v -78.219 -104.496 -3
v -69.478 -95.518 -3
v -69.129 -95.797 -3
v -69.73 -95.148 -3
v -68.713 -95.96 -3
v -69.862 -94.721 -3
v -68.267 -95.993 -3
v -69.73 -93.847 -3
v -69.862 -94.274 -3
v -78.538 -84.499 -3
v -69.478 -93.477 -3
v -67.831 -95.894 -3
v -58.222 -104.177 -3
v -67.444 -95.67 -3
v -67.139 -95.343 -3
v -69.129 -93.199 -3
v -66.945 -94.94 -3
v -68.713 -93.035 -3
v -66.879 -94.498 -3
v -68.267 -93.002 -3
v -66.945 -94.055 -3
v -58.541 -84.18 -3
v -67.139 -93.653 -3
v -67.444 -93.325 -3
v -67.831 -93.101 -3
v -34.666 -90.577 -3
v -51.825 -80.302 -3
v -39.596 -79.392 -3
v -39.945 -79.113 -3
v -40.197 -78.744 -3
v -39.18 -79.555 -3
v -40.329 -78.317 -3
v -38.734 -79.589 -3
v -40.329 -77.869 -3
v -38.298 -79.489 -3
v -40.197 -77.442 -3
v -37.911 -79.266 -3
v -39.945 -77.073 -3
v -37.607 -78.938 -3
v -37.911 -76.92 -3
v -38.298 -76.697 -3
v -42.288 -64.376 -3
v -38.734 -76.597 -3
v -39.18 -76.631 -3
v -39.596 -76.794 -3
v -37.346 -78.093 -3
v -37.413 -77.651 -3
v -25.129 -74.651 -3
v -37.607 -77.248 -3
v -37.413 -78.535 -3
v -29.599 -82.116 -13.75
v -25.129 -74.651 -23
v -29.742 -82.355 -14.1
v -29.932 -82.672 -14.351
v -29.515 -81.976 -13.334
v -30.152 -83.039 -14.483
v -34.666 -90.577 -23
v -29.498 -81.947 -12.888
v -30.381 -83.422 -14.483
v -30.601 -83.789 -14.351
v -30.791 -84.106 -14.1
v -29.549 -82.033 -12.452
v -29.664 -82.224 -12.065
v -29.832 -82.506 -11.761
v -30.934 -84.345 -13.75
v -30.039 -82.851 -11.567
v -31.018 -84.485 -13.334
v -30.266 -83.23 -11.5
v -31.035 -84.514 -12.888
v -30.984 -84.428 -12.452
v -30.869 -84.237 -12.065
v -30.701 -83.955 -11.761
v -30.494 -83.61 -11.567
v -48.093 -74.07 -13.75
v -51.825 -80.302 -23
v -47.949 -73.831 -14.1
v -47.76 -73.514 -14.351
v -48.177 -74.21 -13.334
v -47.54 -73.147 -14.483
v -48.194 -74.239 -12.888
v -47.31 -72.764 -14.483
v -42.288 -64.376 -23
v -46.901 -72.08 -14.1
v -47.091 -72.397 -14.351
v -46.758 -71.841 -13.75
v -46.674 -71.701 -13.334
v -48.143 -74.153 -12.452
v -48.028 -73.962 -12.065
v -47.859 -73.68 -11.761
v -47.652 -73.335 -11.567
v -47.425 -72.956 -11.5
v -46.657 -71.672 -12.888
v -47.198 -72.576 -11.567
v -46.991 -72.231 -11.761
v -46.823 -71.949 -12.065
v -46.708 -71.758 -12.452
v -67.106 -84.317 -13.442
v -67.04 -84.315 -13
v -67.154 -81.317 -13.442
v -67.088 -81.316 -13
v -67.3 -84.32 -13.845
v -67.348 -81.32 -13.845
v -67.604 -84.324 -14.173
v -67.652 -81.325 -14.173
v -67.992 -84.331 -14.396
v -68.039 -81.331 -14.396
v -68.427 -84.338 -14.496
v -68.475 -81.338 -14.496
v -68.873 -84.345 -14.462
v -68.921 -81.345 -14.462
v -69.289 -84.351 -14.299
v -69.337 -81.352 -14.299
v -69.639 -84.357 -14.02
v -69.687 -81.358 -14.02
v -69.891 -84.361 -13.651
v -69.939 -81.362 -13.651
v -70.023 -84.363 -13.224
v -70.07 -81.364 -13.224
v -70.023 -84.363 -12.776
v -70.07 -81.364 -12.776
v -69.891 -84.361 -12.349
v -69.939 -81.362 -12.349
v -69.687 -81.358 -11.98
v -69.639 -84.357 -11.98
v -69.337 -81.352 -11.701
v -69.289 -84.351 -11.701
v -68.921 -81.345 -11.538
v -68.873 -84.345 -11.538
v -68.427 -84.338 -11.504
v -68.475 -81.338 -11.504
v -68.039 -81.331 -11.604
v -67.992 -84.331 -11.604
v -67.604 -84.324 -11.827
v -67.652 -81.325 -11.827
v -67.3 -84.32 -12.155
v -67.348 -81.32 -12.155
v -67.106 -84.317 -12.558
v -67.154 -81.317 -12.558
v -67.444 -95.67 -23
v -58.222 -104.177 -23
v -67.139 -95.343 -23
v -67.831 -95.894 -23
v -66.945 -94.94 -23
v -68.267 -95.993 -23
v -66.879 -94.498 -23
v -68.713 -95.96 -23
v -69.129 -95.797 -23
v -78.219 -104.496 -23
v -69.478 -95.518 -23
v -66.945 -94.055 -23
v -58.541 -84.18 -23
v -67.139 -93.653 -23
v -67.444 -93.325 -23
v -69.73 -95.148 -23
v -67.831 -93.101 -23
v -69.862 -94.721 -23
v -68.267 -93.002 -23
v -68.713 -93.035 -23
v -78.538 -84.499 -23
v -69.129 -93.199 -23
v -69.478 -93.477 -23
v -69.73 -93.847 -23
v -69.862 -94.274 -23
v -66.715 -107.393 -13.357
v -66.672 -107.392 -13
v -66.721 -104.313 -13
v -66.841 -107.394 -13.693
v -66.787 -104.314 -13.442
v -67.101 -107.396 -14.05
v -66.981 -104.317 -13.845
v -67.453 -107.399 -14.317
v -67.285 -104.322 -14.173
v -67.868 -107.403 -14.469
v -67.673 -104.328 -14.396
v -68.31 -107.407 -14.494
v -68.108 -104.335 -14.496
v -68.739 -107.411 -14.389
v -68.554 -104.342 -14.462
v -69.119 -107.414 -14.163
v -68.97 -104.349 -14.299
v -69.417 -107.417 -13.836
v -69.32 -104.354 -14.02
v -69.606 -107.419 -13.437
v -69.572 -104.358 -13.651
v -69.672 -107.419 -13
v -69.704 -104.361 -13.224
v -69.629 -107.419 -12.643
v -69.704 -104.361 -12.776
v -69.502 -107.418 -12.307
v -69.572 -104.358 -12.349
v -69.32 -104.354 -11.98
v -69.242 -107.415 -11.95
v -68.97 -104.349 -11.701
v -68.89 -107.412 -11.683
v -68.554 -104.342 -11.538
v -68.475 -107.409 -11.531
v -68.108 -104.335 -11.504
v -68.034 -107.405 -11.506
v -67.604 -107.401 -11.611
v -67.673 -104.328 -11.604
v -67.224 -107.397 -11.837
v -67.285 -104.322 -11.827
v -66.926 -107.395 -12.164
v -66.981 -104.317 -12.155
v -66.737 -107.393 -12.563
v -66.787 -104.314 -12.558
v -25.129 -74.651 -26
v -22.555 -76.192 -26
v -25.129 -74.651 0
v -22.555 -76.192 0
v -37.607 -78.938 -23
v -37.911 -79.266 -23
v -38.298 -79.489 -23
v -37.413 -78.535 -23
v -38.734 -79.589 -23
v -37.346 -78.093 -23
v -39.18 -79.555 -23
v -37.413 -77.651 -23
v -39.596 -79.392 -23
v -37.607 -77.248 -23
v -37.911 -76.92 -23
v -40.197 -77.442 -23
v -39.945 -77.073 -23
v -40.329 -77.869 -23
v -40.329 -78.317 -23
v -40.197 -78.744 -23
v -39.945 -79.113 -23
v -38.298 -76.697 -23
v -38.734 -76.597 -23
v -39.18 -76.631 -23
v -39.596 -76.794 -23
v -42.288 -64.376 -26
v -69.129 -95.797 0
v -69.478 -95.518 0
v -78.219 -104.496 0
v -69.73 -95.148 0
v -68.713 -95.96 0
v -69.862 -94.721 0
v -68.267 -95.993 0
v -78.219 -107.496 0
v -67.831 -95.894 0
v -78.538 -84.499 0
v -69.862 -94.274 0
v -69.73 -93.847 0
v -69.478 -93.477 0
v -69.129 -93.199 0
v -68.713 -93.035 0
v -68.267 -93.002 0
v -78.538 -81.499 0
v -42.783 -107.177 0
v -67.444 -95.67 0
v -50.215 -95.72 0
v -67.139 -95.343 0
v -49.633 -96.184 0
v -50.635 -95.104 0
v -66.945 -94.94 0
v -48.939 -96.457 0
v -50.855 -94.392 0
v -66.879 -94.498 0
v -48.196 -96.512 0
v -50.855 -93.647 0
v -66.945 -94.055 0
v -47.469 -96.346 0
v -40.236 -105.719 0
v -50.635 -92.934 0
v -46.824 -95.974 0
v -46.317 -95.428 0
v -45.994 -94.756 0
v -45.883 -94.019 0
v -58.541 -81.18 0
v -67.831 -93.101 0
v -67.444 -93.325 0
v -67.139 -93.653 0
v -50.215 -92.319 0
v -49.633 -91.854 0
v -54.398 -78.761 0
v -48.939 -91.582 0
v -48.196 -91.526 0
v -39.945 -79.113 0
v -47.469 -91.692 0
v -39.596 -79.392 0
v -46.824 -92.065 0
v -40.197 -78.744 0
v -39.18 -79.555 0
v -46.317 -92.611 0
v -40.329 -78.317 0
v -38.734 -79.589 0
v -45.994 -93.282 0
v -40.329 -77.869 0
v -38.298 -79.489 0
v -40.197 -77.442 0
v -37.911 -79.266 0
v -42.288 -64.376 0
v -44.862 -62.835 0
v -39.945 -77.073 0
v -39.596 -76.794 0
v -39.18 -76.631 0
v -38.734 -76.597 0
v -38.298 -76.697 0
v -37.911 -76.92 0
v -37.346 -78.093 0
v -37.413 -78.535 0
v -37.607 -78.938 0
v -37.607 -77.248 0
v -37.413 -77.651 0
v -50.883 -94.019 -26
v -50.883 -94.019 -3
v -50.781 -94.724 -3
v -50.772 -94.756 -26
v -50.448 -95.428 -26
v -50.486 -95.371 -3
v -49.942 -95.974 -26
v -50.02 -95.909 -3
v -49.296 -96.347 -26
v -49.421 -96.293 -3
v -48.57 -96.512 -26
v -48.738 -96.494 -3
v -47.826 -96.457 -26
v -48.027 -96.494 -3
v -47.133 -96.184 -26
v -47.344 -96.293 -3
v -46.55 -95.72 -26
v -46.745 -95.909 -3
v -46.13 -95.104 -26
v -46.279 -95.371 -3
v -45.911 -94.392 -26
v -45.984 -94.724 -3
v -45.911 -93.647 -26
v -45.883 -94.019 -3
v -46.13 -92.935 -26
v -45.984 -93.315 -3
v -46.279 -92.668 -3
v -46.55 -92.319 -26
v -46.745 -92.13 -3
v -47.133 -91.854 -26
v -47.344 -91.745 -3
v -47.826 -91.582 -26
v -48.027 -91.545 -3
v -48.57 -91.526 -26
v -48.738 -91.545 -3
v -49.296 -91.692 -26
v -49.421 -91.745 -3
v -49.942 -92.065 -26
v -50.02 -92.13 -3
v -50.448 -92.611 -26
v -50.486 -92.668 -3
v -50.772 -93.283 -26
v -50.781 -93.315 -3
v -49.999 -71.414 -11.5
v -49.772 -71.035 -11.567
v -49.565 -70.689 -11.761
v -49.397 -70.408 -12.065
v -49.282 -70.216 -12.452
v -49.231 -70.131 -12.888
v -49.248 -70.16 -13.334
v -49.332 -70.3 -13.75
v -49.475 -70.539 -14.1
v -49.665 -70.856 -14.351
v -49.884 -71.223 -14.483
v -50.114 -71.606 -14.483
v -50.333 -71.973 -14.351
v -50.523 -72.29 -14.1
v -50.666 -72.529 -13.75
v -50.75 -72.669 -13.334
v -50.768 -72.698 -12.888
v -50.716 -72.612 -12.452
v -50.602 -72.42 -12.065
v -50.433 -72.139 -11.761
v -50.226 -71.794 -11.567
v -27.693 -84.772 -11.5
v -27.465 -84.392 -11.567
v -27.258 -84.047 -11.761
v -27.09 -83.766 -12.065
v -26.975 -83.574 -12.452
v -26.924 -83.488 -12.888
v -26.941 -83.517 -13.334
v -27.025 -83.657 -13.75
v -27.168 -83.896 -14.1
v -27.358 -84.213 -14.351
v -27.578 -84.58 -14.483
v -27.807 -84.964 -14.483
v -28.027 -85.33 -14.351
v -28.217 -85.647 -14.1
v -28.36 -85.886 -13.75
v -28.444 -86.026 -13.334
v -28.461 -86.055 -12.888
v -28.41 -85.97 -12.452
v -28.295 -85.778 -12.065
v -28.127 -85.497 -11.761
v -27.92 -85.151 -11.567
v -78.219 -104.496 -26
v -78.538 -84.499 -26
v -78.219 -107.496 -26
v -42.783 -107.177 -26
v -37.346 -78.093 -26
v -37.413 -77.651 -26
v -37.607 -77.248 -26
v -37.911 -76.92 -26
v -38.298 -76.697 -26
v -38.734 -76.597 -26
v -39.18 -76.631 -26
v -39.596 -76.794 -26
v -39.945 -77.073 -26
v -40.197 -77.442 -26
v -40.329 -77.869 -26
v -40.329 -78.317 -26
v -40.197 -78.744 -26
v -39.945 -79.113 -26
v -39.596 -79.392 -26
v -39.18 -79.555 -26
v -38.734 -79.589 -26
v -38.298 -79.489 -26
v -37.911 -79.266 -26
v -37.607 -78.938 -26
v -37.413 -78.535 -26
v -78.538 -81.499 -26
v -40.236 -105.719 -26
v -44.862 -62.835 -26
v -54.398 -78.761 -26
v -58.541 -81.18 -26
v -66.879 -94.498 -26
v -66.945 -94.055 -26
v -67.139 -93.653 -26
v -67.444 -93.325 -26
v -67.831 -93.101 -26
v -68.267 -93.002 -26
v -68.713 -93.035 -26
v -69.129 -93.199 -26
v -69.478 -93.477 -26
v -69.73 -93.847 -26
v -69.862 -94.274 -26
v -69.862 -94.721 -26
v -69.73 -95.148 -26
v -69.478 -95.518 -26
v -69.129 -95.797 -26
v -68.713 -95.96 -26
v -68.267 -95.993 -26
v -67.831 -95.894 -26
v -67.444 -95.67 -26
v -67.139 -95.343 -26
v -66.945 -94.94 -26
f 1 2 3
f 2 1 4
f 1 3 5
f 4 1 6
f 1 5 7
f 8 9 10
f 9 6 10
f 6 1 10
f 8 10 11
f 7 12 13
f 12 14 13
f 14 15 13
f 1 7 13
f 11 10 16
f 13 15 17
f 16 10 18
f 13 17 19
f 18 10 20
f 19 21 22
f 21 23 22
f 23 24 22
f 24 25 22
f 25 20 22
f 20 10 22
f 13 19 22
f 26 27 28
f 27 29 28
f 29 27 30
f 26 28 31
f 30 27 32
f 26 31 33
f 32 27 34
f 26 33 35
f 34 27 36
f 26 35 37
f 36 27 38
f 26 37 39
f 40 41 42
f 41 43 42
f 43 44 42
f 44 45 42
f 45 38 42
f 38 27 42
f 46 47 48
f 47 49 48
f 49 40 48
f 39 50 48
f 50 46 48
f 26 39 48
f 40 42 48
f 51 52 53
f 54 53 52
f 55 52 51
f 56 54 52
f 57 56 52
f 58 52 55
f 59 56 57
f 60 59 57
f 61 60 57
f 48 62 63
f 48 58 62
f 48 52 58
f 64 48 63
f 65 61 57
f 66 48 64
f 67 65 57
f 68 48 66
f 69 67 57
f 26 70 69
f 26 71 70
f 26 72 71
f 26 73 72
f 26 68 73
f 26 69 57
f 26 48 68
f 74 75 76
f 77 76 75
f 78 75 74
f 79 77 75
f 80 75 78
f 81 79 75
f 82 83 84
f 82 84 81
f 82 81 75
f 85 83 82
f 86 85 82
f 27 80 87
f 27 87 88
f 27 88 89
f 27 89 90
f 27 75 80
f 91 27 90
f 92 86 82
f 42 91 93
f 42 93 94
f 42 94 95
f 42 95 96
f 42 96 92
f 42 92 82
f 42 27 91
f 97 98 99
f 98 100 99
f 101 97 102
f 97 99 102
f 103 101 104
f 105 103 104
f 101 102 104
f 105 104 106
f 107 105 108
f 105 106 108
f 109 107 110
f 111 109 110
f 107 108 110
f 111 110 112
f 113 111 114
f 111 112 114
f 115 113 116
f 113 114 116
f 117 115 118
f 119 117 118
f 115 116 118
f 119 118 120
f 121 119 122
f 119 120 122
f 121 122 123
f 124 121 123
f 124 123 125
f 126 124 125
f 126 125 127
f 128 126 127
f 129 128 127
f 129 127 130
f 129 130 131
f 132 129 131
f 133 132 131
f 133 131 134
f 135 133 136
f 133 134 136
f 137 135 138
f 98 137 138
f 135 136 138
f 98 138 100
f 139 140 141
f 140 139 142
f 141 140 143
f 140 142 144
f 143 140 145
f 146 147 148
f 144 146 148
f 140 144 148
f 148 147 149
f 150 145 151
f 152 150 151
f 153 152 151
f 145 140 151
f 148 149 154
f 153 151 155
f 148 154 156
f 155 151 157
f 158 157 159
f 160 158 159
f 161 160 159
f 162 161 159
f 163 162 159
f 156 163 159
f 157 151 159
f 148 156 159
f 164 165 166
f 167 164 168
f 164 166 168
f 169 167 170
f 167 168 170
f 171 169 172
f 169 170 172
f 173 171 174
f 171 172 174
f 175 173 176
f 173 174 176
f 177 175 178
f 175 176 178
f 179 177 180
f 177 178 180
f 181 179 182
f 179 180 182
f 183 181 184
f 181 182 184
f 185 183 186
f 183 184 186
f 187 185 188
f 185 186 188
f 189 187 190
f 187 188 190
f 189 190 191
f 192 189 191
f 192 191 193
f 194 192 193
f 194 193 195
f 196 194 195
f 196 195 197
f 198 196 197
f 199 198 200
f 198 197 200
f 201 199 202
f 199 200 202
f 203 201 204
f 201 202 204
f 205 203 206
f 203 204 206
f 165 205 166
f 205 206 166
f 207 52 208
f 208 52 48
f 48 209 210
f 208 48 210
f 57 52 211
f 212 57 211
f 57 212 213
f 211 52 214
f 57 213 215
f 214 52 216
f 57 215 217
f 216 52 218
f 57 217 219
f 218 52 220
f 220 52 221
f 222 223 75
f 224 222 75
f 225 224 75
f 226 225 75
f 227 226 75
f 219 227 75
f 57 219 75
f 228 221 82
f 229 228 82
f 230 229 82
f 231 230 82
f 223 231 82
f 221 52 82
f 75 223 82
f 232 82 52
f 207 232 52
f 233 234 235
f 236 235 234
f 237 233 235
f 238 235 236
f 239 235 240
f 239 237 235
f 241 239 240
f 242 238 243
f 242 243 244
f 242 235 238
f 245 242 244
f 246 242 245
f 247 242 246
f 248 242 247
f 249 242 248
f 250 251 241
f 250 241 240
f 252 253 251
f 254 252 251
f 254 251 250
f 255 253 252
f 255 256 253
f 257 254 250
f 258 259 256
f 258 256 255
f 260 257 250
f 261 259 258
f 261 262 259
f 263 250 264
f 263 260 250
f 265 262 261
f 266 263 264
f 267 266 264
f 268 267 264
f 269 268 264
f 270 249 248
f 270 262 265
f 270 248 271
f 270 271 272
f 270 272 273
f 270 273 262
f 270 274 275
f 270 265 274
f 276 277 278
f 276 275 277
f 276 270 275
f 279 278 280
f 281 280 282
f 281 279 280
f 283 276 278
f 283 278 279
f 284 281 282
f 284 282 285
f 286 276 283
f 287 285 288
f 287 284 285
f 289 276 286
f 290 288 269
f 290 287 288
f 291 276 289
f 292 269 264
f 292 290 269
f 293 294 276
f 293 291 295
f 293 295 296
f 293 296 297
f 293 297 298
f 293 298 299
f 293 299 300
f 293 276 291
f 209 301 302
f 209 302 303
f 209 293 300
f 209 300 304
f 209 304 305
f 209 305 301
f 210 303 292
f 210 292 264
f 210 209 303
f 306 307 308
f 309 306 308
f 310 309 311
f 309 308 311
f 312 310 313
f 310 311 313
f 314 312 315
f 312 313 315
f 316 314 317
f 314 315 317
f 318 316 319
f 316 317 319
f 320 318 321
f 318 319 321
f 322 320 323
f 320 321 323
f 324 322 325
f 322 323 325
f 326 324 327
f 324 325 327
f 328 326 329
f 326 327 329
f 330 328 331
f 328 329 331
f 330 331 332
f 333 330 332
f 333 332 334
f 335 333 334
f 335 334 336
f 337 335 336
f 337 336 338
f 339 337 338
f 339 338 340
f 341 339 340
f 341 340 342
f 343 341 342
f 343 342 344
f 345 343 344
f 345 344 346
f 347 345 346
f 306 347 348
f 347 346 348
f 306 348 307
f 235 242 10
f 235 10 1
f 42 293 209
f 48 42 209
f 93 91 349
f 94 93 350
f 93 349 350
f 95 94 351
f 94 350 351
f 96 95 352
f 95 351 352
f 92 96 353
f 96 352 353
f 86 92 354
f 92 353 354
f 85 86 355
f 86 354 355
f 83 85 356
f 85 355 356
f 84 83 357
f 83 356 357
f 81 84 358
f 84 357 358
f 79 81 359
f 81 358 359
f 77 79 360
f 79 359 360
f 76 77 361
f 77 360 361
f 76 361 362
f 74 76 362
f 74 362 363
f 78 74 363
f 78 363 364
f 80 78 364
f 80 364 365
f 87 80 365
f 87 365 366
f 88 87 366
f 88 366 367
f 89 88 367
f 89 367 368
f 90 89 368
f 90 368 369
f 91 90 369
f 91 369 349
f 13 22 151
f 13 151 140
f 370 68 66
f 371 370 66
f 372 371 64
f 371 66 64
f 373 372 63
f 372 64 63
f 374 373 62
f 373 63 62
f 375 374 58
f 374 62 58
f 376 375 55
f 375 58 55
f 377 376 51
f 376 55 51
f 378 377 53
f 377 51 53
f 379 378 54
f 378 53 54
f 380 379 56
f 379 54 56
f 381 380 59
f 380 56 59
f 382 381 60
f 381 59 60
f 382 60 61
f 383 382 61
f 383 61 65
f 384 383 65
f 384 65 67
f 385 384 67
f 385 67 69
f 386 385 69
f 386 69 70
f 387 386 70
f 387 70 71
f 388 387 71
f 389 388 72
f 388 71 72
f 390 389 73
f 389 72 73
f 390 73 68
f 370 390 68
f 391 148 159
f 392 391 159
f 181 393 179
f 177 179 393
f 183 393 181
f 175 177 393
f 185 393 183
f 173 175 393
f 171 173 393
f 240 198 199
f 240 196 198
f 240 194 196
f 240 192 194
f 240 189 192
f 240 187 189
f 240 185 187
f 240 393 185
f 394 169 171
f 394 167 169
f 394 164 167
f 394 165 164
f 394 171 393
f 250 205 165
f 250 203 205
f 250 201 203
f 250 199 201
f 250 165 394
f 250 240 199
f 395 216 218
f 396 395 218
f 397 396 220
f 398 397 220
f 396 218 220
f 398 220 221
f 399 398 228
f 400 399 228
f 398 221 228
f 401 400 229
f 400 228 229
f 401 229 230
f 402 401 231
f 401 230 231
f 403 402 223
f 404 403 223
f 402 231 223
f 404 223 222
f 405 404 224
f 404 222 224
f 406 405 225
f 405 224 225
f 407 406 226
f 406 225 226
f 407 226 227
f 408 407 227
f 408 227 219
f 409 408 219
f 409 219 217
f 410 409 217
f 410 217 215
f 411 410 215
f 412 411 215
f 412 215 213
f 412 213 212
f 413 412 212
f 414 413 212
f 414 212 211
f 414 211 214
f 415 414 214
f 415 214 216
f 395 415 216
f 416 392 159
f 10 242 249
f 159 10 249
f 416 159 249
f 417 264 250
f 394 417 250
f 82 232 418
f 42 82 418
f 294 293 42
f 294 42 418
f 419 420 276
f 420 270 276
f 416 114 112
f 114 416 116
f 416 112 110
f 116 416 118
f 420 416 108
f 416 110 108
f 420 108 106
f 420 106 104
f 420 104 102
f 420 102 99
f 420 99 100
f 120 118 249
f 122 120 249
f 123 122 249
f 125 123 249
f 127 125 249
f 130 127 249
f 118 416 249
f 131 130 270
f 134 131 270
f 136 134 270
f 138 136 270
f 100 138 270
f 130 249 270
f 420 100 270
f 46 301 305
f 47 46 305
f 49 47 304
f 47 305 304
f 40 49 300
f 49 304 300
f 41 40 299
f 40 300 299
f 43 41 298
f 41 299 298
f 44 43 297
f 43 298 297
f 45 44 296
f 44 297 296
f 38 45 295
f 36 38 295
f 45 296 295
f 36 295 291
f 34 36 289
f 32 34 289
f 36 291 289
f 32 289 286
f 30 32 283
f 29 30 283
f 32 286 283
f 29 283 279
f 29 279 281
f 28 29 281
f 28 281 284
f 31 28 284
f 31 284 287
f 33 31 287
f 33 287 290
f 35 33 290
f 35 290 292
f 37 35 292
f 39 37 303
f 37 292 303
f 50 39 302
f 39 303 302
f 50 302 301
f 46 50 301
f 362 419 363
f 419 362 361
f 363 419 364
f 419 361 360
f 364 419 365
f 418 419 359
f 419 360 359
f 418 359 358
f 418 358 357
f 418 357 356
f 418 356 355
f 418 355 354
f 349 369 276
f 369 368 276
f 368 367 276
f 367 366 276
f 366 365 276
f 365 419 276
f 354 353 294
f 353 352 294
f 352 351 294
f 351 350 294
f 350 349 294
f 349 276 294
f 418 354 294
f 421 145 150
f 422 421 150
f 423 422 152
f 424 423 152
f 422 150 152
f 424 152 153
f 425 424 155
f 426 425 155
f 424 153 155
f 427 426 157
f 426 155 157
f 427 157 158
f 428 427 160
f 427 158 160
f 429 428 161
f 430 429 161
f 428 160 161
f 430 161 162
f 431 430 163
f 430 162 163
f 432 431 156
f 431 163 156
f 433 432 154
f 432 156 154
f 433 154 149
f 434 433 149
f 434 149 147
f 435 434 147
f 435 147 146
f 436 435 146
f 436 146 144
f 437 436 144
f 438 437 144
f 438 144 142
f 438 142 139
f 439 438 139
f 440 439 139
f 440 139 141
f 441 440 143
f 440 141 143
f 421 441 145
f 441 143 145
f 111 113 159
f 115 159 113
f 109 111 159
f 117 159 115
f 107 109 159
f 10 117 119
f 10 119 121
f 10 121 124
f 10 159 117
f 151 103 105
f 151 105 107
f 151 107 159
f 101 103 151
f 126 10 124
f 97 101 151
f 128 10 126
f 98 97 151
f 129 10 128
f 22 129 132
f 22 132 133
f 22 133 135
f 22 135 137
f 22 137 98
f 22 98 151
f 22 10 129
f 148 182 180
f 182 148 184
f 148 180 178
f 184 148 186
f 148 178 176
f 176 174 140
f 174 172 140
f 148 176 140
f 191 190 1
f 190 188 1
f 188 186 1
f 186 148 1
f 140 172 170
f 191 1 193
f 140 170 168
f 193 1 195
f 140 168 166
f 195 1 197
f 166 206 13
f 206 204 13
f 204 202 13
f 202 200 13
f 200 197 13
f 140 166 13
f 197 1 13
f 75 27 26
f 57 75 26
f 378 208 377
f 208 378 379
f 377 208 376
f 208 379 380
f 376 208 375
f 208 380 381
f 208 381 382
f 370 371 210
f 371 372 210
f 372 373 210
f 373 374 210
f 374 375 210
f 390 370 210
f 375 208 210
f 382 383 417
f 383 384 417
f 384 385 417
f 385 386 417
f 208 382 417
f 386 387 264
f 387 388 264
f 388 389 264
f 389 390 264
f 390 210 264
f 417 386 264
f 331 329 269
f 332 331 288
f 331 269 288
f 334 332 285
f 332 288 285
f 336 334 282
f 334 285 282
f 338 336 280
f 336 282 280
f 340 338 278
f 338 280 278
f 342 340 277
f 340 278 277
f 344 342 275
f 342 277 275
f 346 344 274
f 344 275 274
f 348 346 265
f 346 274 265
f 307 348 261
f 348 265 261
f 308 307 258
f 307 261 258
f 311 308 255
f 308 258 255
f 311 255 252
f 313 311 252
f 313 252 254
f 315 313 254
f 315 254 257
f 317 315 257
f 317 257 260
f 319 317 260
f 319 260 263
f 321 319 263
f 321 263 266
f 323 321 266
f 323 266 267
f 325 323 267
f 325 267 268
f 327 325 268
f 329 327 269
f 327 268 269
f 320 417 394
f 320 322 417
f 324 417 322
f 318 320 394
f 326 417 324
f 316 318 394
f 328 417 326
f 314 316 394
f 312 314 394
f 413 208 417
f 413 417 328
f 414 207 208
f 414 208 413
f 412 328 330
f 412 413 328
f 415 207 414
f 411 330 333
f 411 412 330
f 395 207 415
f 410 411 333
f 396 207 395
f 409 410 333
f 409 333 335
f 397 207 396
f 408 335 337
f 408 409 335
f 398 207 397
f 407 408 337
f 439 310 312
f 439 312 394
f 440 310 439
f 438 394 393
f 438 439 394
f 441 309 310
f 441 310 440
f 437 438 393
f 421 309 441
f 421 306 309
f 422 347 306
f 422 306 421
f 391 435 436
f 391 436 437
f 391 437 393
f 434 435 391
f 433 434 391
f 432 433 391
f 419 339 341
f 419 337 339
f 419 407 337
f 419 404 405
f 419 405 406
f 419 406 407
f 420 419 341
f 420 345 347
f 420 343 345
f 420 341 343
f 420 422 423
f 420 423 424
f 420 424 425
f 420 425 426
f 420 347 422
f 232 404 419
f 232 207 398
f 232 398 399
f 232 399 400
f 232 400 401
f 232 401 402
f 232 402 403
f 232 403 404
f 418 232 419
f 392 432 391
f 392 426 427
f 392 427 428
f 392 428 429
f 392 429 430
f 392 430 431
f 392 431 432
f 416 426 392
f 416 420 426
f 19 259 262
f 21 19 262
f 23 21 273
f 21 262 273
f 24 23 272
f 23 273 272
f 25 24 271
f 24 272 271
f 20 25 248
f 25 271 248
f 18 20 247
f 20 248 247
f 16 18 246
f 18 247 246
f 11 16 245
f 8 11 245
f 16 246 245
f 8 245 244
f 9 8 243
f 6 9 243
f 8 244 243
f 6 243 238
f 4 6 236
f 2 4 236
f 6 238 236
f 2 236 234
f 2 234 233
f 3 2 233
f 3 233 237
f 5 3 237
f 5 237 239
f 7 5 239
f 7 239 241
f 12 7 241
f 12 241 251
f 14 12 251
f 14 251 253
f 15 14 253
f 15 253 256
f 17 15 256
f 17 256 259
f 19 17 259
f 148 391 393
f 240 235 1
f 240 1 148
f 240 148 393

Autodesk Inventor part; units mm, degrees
ref_plane "YZ Plane" through (0, 0, 0) normal (1, 0, 0) x (0, 1, 0)
ref_plane "XZ Plane" through (0, 0, 0) normal (0, 1, 0) x (-1, 0, 0)
ref_plane "XY Plane" through (0, 0, 0) normal (0, 0, 1) x (1, 0, 0)
sketch "Sketch1" plane through (0, 0, 0) normal (0, 0, 1) x (1, 0, 0)
  circle A0 centre (-48.3826, -94.0192) radius 2.5
  circle A1 centre (2.8152, 8.6005) radius 2.5
  line L0 (-48.3826, -94.0192) -> (40.5013, 54.4144)
  line L1 (2.8152, 8.6005) -> (32.8522, -42.034)
  line L2 (-2.0828, 38.9998) -> (-2.0828, -39)
  line L3 (-2.0828, -0.0001) -> (69.8745, -0.0001)
  line L4 (7.9172, -0.0001) -> (-0.6834, -5.1021)
  line L5 (2.8152, 8.6005) -> (7.9172, -0.0001)
  line L6 (7.9172, -0.0001) -> (16.5177, 5.1019)
  line L7 (7.9172, -0.0001) -> (-0.6834, -5.1021)
  line L8 (-0.6834, -5.1021) -> (-0.6834, -5.1021)
  line L9 (7.9172, -0.0001) -> (16.5177, 5.1019)
  line L10 (16.5177, 5.1019) -> (16.5177, 5.1019)
  line L11 (7.9172, -0.0001) -> (-0.6622, 5.1374)
  line L12 (7.9172, -0.0001) -> (16.4966, -5.1375)
  line L13 (-48.3826, -94.0192) -> (-43.2452, -85.4397)
  line L14 (-54.6233, -56.9895) -> (-9.7188, -83.8789)
  line L15 (-43.2452, -85.4397) -> (-34.6657, -90.5772)
  line L16 (-43.2452, -85.4397) -> (-51.8246, -80.3023)
  line L17 (-34.6657, -90.5772) -> (16.4966, -5.1375)
  line L18 (-0.6622, 5.1374) -> (-51.8246, -80.3023)
  line L19 (-3.7386, 0) -> (13.452, 10.2217)
  line L20 (-3.7386, 0) -> (13.4203, -10.2749)
  circle A2 centre (6.9172, -34) radius 2.5
  circle A3 centre (6.9172, -34) radius 5
  circle A4 centre (6.9172, 34) radius 2.5
  circle A5 centre (6.9172, 34) radius 4.9998
  line L21 (15.8878, 38.9998) -> (-2.0828, 38.9998)
  line L22 (-2.0828, -39) -> (15.933, -39)
  line L23 (-13.3434, -16.0398) -> (19.6624, -35.8041)
  line L24 (-13.3434, 16.0396) -> (19.6624, 35.8039)
  line L25 (-13.3434, -16.0398) -> (-15.9172, -14.4985)
  line L26 (-2.0828, -0.0001) -> (-26.2435, -0.0001)
  line L27 (-15.9172, -14.4985) -> (-7.2354, -0.0001)
  line L28 (-13.3434, 16.0396) -> (-15.9172, 14.4984)
  line L29 (-15.9172, 14.4984) -> (-7.2354, -0.0001)
  line L30 (13.4203, -10.2749) -> (15.9172, -11.7701)
  line L31 (15.933, -39) -> (15.8878, 38.9998)
  line L32 (13.452, 10.2217) -> (15.9037, 11.6795)
  line L33 (15.9037, 11.6795) -> (6.3124, 27.8097)
  line L34 (15.9172, -11.7701) -> (6.3124, -27.8099)
  line L35 (15.9037, 11.6795) -> (15.9172, -11.7701)
  line L36 (-15.9172, -14.4985) -> (-15.9172, 14.4984)
  line L37 (6.3124, 27.8097) -> (-15.9172, 14.4984) projected
  circle A6 centre (-48.3826, -94.0192) radius 2.5
  line L38 (-311.4249, 0) -> (127.5863, 0)
  line L39 (-170.3704, -117.2696) -> (-13.4682, 154.4931)
  line L40 (-102.6648, 0) -> (-157.9558, -95.7668)
  line L41 (-157.9558, -95.7668) -> (-48.3826, -94.0192)
  line L42 (-48.3826, -94.0192) -> (-58.3814, -94.1786)
  line L43 (-58.3814, -94.1786) -> (-58.5408, -84.1799)
  line L44 (-58.5408, -84.1799) -> (-58.2219, -104.1774)
  line L45 (-51.8246, -80.3023) -> (-41.5497, -63.1434)
  line L46 (-41.5497, -63.1434) -> (-24.3908, -73.4184)
  line L47 (-58.5408, -84.1799) -> (-78.5383, -84.4989)
  line L48 (-78.5383, -84.4989) -> (-78.2193, -104.4963)
  line L49 (-78.2193, -104.4963) -> (-58.2219, -104.1774)
  line L50 (-58.5408, -84.1799) -> (-51.8246, -80.3023)
  line L51 (-58.2219, -104.1774) -> (-26.2433, -104.1774)
  line L52 (-34.6657, -90.5772) -> (-48.6317, -113.8999)
  circle A7 centre (-48.3828, -94.0194) radius 2.5 projected
  point P0 (0, 0)
  point P1 (6.9172, -21)
  point P2 (-3.7386, 0)
  point P3 (-42.2878, -64.3761)
  point P4 (-42.8097, -104.1774)
  point P5 (-25.129, -74.6511)
  dimension "d0" = 10
  dimension "d1" = 10
  dimension "d2" = 10
  dimension "d3" = 10
  dimension "d4" = 10
  dimension "d5" = 10
  dimension "d6" = 10
  dimension "d7" = 10
  dimension "d8" = 10
  dimension "d9" = 10
  dimension "d10" = 10
  dimension "d11" = 20
  dimension "d12" = 20
  dimension "d13" = 3
  dimension "d14" = 3
  dimension "d20" = 110.582
  dimension "d21" = 10
  dimension "d22" = 10
  dimension "d23" = 20
  dimension "d24" = 20
  dimension "d25" = 20
  dimension "d26" = 121.827
  dimension "d27" = 146.9972
extrude "Extrusion1" add sketch "Sketch1" against normal blind 3 contours A0 L0 L15 L52 L51 L44 L41 | A0 L41 L43 L50 L16 L0 | L16 L18 L14 L0 | L0 L14 L17 L15 | L44 L49 L48 L41 | L41 L48 L47 L43
sketch "Sketch2" plane through (0, 0, -3) normal (0, 0, -1) x (-1, 0, 0)
  line L0 (51.8246, -80.3023) -> (42.2878, -64.3761) projected
  line L1 (25.129, -74.6511) -> (42.8097, -104.1774) projected
  line L2 (78.5383, -84.4989) -> (58.5408, -84.1799)
  line L3 (58.5408, -84.1799) -> (51.8246, -80.3023)
  line L4 (42.2878, -64.3761) -> (25.129, -74.6511)
  line L5 (78.5383, -84.4989) -> (78.2193, -104.4963)
  line L6 (58.5408, -84.1799) -> (58.5408, -81.1799)
  line L7 (51.8246, -80.3023) -> (54.3984, -78.761)
  line L8 (42.8097, -104.1774) -> (40.2359, -105.7186)
  line L9 (42.8097, -104.1774) -> (42.7827, -107.1772)
  line L10 (78.5383, -84.4989) -> (78.5383, -81.4989)
  line L11 (78.2193, -104.4963) -> (78.2193, -107.4963)
  line L12 (42.2878, -64.3761) -> (44.8616, -62.8349)
  line L13 (42.2878, -64.3761) -> (25.129, -74.6511) projected
  line L14 (25.129, -74.6511) -> (22.5551, -76.1923)
  line L15 (78.5383, -81.4989) -> (58.5408, -81.1799)
  line L16 (58.5408, -81.1799) -> (54.3984, -78.761)
  line L17 (54.3984, -78.761) -> (44.8616, -62.8349)
  line L18 (22.5551, -76.1923) -> (40.2359, -105.7186)
  line L19 (40.2359, -105.7186) -> (42.7827, -107.1772)
  line L20 (78.2193, -107.4963) -> (42.7827, -107.1772)
  line L21 (58.5408, -84.1799) -> (58.2219, -104.1774)
  line L22 (51.8246, -80.3023) -> (34.6657, -90.5772)
  circle A0 centre (48.3826, -94.0192) radius 2.5 projected
  circle A1 centre (48.3826, -94.0192) radius 2.5
  line L23 (78.2193, -104.4963) -> (42.8097, -104.1774)
  line L24 (58.2219, -104.1774) -> (42.8097, -104.1774) projected
  line L25 (78.2193, -104.4963) -> (58.2219, -104.1774) projected
  point P0 (0, 0)
  dimension "d30" = 3
  dimension "d31" = 3
  dimension "d32" = 3
  dimension "d33" = 3
  dimension "d34" = 3
  dimension "d35" = 3
  dimension "d36" = 3
  dimension "d37" = 3
extrude "Extrusion2" add sketch "Sketch2" along normal blind 20 and the other way blind 3 contours L7 L16 L6 L3 | L0 L12 L17 L7 | L6 L15 L10 L2 | L1 L8 L18 L14 | L25 L23 L24 | L9 L19 L8 | L23 L11 L20 L9
sketch "Sketch3" plane through (0, 0, -3) normal (0, 0, -1) x (-1, 0, 0)
  line L0 (58.5408, -84.1799) -> (51.8246, -80.3023) projected
  line L1 (51.8246, -80.3023) -> (34.6657, -90.5772)
  line L2 (25.129, -74.6511) -> (42.8097, -104.1774) projected
  line L3 (42.8097, -104.1774) -> (58.2219, -104.1774) projected
  line L4 (58.5408, -84.1799) -> (58.2219, -104.1774)
  line L5 (78.2193, -104.4963) -> (42.8097, -104.1774) projected
  line L6 (42.8097, -104.1774) -> (25.129, -74.6511) projected
  circle A0 centre (48.3828, -94.0194) radius 2.5 projected
  point P0 (0, 0)
  dimension "d42" = 119.086
extrude "Extrusion3" add sketch "Sketch3" along normal blind 20
sketch "Sketch4" plane through (0, 0, -23) normal (0, 0, -1) x (-1, 0, 0)
  point P0 (0, 0)
sketch "Sketch5" plane through (0, 0, -23) normal (0, 0, -1) x (-1, 0, 0)
  circle A0 centre (48.3828, -94.0194) radius 2.5 projected
  line L0 (44.8616, -62.8349) -> (42.2878, -64.3761) projected
  line L1 (42.2878, -64.3761) -> (51.8246, -80.3023) projected
  line L2 (51.8246, -80.3023) -> (34.6657, -90.5772) projected
  line L3 (34.6657, -90.5772) -> (25.129, -74.6511) projected
  line L4 (25.129, -74.6511) -> (22.5551, -76.1923) projected
  line L5 (22.5551, -76.1923) -> (40.2359, -105.7186) projected
  line L6 (40.2359, -105.7186) -> (42.7827, -107.1772) projected
  line L7 (42.7827, -107.1772) -> (78.2193, -107.4963) projected
  line L8 (78.2193, -107.4963) -> (78.2193, -104.4963) projected
  line L9 (78.2193, -104.4963) -> (58.2219, -104.1774) projected
  line L10 (58.2219, -104.1774) -> (58.5408, -84.1799) projected
  line L11 (58.5408, -84.1799) -> (78.5383, -84.4989) projected
  line L12 (78.5383, -84.4989) -> (78.5383, -81.4989) projected
  line L13 (78.5383, -81.4989) -> (58.5408, -81.1799) projected
  line L14 (58.5408, -81.1799) -> (54.3984, -78.761) projected
  line L15 (54.3984, -78.761) -> (44.8616, -62.8349) projected
  line L16 (58.5408, -84.1799) -> (58.2219, -104.1774) projected
  line L17 (58.2219, -104.1774) -> (78.2193, -104.4963) projected
  line L18 (78.2193, -104.4963) -> (78.5383, -84.4989) projected
  line L19 (78.5383, -84.4989) -> (58.5408, -84.1799) projected
  line L20 (34.6657, -90.5772) -> (51.8246, -80.3023) projected
  line L21 (51.8246, -80.3023) -> (42.2878, -64.3761) projected
  line L22 (42.2878, -64.3761) -> (25.129, -74.6511) projected
  line L23 (25.129, -74.6511) -> (34.6657, -90.5772) projected
  point P0 (0, 0)
extrude "Extrusion4" add sketch "Sketch5" along normal blind 3
sketch "Sketch6" plane through (0, 0, 0) normal (0, 0, 1) x (1, 0, 0)
  line L0 (-42.2878, -64.3761) -> (-25.129, -74.6511) projected
  line L1 (-33.7084, -69.5136) -> (-49.5228, -95.9232)
  line L2 (-33.7084, -69.5136) -> (-38.8459, -78.093)
  circle A0 centre (-38.8459, -78.093) radius 1.5
  line L3 (-78.5383, -84.4989) -> (-78.2193, -104.4963) projected
  line L4 (-78.3788, -94.4976) -> (-68.3788, -94.4976)
  circle A1 centre (-68.3788, -94.4976) radius 1.5
  point P0 (0, 0)
  dimension "d47" = 10
  dimension "d48" = 3
  dimension "d56" = 10
  dimension "d57" = 3
extrude "Extrusion5" cut sketch "Sketch6" against normal through all
sketch "Sketch7" plane through (-44.8616, -62.8349, -26) normal (-0.857942, 0.5137465, 0) x (0, 0, 1)
  line L0 (0, 0) -> (26, 0) projected
  line L1 (26, 0) -> (13, 0)
  line L2 (13, 0) -> (13, -10)
  line L3 (13, -10) -> (26, -10)
  line L4 (26, -10) -> (26, 0)
  circle A0 centre (13, -10) radius 1.5
  point P0 (26, 76.9562)
  dimension "d51" = 13
  dimension "d52" = 10
  dimension "d53" = 3
extrude "Extrusion6" cut sketch "Sketch7" against normal through all contours A0 L3 L2 | L2 L3 A0
sketch "Sketch8" plane through (-58.5408, -81.1799, 0) normal (-0.0159478, 0.9998728, 0) x (0.9998728, 0.0159478, 0)
  line L0 (-20.0478, 3) -> (-20.0478, 23) projected
  line L1 (-20.0478, 13) -> (-10.0478, 13)
  circle A0 centre (-10.0478, 13) radius 1.5
  point P0 (59.828, 0)
  dimension "d58" = 10
  dimension "d59" = 3
extrude "Extrusion7" cut sketch "Sketch8" against normal through all
properties part number "2020_nodes_conn"
